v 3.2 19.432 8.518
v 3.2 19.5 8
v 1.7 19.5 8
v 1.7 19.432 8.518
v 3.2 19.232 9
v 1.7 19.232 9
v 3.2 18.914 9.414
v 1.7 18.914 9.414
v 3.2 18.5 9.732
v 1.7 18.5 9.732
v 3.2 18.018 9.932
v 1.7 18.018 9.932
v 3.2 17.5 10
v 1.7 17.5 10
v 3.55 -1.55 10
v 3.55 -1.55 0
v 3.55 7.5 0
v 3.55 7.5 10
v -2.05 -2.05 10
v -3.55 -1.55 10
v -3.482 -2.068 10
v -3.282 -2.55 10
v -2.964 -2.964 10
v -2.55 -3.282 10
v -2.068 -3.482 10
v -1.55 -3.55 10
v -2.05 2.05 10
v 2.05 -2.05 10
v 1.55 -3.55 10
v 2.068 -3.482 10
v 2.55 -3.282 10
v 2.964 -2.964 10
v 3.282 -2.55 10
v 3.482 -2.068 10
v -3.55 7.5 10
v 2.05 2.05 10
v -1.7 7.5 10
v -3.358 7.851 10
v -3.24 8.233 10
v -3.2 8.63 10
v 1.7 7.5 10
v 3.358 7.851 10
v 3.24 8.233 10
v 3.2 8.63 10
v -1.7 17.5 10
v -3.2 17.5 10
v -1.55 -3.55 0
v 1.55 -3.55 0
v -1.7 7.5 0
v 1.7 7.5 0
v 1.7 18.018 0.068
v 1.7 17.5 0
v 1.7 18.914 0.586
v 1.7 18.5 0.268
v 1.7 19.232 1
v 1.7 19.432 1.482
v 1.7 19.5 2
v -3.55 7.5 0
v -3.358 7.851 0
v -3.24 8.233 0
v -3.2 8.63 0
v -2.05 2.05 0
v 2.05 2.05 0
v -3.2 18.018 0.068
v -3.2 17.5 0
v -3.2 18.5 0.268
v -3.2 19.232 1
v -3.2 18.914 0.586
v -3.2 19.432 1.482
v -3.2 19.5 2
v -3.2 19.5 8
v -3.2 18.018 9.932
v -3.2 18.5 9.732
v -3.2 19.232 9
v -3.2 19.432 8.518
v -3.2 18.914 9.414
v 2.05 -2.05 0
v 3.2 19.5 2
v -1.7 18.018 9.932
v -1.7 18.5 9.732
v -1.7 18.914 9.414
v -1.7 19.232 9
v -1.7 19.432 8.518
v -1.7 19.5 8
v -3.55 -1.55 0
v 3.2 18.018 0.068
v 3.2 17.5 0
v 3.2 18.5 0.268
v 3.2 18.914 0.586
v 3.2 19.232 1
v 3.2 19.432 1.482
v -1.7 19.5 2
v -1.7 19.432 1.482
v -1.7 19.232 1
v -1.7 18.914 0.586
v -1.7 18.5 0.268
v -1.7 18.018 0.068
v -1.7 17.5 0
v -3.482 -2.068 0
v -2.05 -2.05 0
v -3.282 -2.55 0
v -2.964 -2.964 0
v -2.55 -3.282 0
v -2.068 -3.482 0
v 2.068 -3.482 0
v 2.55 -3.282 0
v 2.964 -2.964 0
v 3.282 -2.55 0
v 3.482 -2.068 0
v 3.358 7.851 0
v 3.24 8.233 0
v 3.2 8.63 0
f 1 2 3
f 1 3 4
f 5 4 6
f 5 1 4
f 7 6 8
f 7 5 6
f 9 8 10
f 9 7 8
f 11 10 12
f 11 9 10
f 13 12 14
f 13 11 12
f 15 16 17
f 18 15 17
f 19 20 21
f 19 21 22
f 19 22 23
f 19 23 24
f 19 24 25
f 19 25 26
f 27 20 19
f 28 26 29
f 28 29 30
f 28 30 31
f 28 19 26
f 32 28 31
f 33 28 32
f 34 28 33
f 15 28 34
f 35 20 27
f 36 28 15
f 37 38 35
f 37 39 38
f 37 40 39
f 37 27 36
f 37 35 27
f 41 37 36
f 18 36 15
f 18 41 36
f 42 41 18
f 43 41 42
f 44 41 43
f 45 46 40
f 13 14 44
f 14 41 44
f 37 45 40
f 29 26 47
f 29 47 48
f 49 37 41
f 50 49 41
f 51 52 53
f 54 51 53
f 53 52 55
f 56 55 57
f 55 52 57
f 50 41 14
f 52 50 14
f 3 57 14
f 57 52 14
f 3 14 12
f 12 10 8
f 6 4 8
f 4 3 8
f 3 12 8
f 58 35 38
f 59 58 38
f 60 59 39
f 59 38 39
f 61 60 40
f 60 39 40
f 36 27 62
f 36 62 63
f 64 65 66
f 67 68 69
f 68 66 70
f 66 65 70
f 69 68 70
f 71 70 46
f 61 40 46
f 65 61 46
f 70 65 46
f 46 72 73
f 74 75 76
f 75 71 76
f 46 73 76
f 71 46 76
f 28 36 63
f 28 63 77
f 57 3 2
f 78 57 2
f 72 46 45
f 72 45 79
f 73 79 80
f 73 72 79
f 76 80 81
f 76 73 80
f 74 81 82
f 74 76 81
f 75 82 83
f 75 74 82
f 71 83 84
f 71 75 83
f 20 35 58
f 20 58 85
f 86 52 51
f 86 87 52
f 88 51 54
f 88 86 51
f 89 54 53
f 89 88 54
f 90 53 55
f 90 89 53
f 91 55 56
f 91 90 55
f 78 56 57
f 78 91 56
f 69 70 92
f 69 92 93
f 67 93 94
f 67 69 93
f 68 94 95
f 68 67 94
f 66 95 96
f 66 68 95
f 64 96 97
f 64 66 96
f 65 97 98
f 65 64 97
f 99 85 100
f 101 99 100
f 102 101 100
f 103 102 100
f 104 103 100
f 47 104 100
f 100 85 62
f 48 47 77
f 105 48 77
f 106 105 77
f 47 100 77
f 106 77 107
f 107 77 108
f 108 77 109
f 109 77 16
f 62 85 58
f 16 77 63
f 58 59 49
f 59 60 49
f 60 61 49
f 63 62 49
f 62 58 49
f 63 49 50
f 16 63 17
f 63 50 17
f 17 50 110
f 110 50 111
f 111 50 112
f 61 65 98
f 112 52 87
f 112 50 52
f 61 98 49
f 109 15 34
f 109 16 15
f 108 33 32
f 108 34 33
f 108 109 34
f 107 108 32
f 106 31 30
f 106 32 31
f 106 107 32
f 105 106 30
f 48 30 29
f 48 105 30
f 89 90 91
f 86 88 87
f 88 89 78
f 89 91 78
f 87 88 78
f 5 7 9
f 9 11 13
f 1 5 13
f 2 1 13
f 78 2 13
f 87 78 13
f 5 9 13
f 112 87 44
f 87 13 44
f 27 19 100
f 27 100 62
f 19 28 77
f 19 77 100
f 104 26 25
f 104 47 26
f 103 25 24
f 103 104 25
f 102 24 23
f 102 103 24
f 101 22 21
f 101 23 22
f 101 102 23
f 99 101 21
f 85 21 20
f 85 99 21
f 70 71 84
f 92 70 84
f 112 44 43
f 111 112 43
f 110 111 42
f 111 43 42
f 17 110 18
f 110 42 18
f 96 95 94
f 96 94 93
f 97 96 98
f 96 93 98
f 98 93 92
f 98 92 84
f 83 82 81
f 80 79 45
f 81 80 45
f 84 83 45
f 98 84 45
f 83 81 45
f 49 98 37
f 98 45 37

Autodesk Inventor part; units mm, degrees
ref_plane "YZ Plane" through (0, 0, 0) normal (1, 0, 0) x (0, 1, 0)
ref_plane "XZ Plane" through (0, 0, 0) normal (0, 1, 0) x (-1, 0, 0)
ref_plane "XY Plane" through (0, 0, 0) normal (0, 0, 1) x (1, 0, 0)
sketch "Sketch1" plane through (0, 0, 0) normal (0, 0, 1) x (1, 0, 0)
  line L0 (-2.05, 2.05) -> (2.05, 2.05)
  line L1 (2.05, 2.05) -> (2.05, -2.05)
  line L2 (2.05, -2.05) -> (-2.05, -2.05)
  line L3 (-2.05, -2.05) -> (-2.05, 2.05)
  line L4 (0, 2.05) -> (0, -2.05) construction
  line L5 (0, 7.5) -> (-15.55, 7.5)
  line L6 (-15.55, 7.5) -> (-15.55, 6)
  line L7 (-15.55, 6) -> (-3.55, 6)
  line L8 (-3.55, 6) -> (-3.55, -6)
  line L9 (-3.55, -6) -> (-15.55, -6)
  line L10 (-15.55, -6) -> (-15.55, -7.5)
  line L11 (-15.55, -7.5) -> (-0.55, -7.5)
  line L12 (-2.05, 0) -> (2.05, 0) construction
  line L13 (0, 7.5) -> (15.55, 7.5)
  line L14 (15.55, 7.5) -> (15.55, 6)
  line L15 (15.55, 6) -> (3.55, 6)
  line L16 (3.55, 6) -> (3.55, -6)
  line L17 (3.55, -6) -> (15.55, -6)
  line L18 (15.55, -6) -> (15.55, -7.5)
  line L19 (15.55, -7.5) -> (-0.55, -7.5)
  line L20 (-2.05, 2.05) -> (2.05, -2.05) construction
  line L21 (2.05, 2.05) -> (-2.05, -2.05) construction
  line L22 (0, 7.5) -> (0, 2.05) construction
  line L23 (-3.55, 6) -> (-3.55, 7.5)
  line L24 (-3.55, -6) -> (-3.55, -7.5)
  line L25 (3.55, 6) -> (3.55, 7.5)
  line L26 (3.55, -6) -> (3.55, -7.5)
  point P0 (0, 0)
  point P1 (0, 0)
  point P2 (0, 0)
  dimension "d3" = 4.1
  dimension "d4" = 4.1
  dimension "d5" = 12
  dimension "d6" = 1.5
  dimension "d7" = 1.5
  dimension "d8" = 5.45
  dimension "d9" = 5.45
  dimension "d10" = 1.5
  dimension "d11" = 12
  dimension "d37" = 15
extrude "Extrusion1" add sketch "Sketch1" along normal blind 10 contours L13 L25 L16 L26 L19 L11 L24 L8 L23 L5
sketch "Sketch5" plane through (0, 0, 10) normal (0, 0, 1) x (1, 0, 0)
  line L0 (1.7, 19.5) -> (3.2, 19.5)
  line L1 (3.2, 19.5) -> (3.2, 7.5)
  line L2 (3.2, 7.5) -> (1.7, 7.5)
  line L3 (1.7, 7.5) -> (1.7, 19.5)
  line L4 (3.55, 7.5) -> (-3.55, 7.5) projected
  line L5 (3.55, -7.5) -> (3.55, 7.5) projected
  line L6 (0, 0) -> (0, 23.4065) construction
  point P0 (15.55, 7.5)
  point P1 (-15.55, 7.5)
  point P2 (3.55, -6)
  point P3 (3.55, 6)
  dimension "d41" = 1.5
  dimension "d42" = 12
  dimension "d47" = 1.7
extrude "Extrusion5" add sketch "Sketch5" against normal up to surface (10 mm away)
mirror "Mirror1" about plane through (0, 0, 0) normal (1, 0, 0) of "Extrusion5"
sketch "Sketch8" plane through (0, 0, 10) normal (0, 0, 1) x (1, 0, 0)
  line L0 (-3.55, -3.55) -> (3.55, -3.55)
  line L1 (3.55, -3.55) -> (3.55, -7.5)
  line L2 (3.55, -7.5) -> (-3.55, -7.5)
  line L3 (-3.55, -7.5) -> (-3.55, -3.55)
  line L4 (2.05, -2.05) -> (-2.05, -2.05) projected
  line L5 (3.55, -7.5) -> (3.55, 7.5) projected
  line L6 (-3.55, 7.5) -> (-3.55, -7.5) projected
  line L7 (-3.55, -7.5) -> (3.55, -7.5) projected
  point P0 (0, 0)
  point P1 (3.55, 5)
  point P2 (-3.55, 5)
  dimension "d57" = 1.5
extrude "Extrusion8" cut sketch "Sketch8" against normal blind 10
fillet "Fillet4" radius 2 4 edges at (-2.45, 19.5, 10) (-2.45, 19.5, 0) (2.45, 19.5, 0) (2.45, 19.5, 10)
fillet "Fillet5" radius 2 2 edges at (3.55, -3.55, 5) (-3.55, -3.55, 5)
fillet "Fillet6" radius 2 2 edges at (-3.2, 7.5, 5) (3.2, 7.5, 5)
equation "\"d7\" = d6"
equation "\"d8\" = d9"
properties part number "fuselage_tail_interface_airfoiled_v2" material "ABS Plastic"
